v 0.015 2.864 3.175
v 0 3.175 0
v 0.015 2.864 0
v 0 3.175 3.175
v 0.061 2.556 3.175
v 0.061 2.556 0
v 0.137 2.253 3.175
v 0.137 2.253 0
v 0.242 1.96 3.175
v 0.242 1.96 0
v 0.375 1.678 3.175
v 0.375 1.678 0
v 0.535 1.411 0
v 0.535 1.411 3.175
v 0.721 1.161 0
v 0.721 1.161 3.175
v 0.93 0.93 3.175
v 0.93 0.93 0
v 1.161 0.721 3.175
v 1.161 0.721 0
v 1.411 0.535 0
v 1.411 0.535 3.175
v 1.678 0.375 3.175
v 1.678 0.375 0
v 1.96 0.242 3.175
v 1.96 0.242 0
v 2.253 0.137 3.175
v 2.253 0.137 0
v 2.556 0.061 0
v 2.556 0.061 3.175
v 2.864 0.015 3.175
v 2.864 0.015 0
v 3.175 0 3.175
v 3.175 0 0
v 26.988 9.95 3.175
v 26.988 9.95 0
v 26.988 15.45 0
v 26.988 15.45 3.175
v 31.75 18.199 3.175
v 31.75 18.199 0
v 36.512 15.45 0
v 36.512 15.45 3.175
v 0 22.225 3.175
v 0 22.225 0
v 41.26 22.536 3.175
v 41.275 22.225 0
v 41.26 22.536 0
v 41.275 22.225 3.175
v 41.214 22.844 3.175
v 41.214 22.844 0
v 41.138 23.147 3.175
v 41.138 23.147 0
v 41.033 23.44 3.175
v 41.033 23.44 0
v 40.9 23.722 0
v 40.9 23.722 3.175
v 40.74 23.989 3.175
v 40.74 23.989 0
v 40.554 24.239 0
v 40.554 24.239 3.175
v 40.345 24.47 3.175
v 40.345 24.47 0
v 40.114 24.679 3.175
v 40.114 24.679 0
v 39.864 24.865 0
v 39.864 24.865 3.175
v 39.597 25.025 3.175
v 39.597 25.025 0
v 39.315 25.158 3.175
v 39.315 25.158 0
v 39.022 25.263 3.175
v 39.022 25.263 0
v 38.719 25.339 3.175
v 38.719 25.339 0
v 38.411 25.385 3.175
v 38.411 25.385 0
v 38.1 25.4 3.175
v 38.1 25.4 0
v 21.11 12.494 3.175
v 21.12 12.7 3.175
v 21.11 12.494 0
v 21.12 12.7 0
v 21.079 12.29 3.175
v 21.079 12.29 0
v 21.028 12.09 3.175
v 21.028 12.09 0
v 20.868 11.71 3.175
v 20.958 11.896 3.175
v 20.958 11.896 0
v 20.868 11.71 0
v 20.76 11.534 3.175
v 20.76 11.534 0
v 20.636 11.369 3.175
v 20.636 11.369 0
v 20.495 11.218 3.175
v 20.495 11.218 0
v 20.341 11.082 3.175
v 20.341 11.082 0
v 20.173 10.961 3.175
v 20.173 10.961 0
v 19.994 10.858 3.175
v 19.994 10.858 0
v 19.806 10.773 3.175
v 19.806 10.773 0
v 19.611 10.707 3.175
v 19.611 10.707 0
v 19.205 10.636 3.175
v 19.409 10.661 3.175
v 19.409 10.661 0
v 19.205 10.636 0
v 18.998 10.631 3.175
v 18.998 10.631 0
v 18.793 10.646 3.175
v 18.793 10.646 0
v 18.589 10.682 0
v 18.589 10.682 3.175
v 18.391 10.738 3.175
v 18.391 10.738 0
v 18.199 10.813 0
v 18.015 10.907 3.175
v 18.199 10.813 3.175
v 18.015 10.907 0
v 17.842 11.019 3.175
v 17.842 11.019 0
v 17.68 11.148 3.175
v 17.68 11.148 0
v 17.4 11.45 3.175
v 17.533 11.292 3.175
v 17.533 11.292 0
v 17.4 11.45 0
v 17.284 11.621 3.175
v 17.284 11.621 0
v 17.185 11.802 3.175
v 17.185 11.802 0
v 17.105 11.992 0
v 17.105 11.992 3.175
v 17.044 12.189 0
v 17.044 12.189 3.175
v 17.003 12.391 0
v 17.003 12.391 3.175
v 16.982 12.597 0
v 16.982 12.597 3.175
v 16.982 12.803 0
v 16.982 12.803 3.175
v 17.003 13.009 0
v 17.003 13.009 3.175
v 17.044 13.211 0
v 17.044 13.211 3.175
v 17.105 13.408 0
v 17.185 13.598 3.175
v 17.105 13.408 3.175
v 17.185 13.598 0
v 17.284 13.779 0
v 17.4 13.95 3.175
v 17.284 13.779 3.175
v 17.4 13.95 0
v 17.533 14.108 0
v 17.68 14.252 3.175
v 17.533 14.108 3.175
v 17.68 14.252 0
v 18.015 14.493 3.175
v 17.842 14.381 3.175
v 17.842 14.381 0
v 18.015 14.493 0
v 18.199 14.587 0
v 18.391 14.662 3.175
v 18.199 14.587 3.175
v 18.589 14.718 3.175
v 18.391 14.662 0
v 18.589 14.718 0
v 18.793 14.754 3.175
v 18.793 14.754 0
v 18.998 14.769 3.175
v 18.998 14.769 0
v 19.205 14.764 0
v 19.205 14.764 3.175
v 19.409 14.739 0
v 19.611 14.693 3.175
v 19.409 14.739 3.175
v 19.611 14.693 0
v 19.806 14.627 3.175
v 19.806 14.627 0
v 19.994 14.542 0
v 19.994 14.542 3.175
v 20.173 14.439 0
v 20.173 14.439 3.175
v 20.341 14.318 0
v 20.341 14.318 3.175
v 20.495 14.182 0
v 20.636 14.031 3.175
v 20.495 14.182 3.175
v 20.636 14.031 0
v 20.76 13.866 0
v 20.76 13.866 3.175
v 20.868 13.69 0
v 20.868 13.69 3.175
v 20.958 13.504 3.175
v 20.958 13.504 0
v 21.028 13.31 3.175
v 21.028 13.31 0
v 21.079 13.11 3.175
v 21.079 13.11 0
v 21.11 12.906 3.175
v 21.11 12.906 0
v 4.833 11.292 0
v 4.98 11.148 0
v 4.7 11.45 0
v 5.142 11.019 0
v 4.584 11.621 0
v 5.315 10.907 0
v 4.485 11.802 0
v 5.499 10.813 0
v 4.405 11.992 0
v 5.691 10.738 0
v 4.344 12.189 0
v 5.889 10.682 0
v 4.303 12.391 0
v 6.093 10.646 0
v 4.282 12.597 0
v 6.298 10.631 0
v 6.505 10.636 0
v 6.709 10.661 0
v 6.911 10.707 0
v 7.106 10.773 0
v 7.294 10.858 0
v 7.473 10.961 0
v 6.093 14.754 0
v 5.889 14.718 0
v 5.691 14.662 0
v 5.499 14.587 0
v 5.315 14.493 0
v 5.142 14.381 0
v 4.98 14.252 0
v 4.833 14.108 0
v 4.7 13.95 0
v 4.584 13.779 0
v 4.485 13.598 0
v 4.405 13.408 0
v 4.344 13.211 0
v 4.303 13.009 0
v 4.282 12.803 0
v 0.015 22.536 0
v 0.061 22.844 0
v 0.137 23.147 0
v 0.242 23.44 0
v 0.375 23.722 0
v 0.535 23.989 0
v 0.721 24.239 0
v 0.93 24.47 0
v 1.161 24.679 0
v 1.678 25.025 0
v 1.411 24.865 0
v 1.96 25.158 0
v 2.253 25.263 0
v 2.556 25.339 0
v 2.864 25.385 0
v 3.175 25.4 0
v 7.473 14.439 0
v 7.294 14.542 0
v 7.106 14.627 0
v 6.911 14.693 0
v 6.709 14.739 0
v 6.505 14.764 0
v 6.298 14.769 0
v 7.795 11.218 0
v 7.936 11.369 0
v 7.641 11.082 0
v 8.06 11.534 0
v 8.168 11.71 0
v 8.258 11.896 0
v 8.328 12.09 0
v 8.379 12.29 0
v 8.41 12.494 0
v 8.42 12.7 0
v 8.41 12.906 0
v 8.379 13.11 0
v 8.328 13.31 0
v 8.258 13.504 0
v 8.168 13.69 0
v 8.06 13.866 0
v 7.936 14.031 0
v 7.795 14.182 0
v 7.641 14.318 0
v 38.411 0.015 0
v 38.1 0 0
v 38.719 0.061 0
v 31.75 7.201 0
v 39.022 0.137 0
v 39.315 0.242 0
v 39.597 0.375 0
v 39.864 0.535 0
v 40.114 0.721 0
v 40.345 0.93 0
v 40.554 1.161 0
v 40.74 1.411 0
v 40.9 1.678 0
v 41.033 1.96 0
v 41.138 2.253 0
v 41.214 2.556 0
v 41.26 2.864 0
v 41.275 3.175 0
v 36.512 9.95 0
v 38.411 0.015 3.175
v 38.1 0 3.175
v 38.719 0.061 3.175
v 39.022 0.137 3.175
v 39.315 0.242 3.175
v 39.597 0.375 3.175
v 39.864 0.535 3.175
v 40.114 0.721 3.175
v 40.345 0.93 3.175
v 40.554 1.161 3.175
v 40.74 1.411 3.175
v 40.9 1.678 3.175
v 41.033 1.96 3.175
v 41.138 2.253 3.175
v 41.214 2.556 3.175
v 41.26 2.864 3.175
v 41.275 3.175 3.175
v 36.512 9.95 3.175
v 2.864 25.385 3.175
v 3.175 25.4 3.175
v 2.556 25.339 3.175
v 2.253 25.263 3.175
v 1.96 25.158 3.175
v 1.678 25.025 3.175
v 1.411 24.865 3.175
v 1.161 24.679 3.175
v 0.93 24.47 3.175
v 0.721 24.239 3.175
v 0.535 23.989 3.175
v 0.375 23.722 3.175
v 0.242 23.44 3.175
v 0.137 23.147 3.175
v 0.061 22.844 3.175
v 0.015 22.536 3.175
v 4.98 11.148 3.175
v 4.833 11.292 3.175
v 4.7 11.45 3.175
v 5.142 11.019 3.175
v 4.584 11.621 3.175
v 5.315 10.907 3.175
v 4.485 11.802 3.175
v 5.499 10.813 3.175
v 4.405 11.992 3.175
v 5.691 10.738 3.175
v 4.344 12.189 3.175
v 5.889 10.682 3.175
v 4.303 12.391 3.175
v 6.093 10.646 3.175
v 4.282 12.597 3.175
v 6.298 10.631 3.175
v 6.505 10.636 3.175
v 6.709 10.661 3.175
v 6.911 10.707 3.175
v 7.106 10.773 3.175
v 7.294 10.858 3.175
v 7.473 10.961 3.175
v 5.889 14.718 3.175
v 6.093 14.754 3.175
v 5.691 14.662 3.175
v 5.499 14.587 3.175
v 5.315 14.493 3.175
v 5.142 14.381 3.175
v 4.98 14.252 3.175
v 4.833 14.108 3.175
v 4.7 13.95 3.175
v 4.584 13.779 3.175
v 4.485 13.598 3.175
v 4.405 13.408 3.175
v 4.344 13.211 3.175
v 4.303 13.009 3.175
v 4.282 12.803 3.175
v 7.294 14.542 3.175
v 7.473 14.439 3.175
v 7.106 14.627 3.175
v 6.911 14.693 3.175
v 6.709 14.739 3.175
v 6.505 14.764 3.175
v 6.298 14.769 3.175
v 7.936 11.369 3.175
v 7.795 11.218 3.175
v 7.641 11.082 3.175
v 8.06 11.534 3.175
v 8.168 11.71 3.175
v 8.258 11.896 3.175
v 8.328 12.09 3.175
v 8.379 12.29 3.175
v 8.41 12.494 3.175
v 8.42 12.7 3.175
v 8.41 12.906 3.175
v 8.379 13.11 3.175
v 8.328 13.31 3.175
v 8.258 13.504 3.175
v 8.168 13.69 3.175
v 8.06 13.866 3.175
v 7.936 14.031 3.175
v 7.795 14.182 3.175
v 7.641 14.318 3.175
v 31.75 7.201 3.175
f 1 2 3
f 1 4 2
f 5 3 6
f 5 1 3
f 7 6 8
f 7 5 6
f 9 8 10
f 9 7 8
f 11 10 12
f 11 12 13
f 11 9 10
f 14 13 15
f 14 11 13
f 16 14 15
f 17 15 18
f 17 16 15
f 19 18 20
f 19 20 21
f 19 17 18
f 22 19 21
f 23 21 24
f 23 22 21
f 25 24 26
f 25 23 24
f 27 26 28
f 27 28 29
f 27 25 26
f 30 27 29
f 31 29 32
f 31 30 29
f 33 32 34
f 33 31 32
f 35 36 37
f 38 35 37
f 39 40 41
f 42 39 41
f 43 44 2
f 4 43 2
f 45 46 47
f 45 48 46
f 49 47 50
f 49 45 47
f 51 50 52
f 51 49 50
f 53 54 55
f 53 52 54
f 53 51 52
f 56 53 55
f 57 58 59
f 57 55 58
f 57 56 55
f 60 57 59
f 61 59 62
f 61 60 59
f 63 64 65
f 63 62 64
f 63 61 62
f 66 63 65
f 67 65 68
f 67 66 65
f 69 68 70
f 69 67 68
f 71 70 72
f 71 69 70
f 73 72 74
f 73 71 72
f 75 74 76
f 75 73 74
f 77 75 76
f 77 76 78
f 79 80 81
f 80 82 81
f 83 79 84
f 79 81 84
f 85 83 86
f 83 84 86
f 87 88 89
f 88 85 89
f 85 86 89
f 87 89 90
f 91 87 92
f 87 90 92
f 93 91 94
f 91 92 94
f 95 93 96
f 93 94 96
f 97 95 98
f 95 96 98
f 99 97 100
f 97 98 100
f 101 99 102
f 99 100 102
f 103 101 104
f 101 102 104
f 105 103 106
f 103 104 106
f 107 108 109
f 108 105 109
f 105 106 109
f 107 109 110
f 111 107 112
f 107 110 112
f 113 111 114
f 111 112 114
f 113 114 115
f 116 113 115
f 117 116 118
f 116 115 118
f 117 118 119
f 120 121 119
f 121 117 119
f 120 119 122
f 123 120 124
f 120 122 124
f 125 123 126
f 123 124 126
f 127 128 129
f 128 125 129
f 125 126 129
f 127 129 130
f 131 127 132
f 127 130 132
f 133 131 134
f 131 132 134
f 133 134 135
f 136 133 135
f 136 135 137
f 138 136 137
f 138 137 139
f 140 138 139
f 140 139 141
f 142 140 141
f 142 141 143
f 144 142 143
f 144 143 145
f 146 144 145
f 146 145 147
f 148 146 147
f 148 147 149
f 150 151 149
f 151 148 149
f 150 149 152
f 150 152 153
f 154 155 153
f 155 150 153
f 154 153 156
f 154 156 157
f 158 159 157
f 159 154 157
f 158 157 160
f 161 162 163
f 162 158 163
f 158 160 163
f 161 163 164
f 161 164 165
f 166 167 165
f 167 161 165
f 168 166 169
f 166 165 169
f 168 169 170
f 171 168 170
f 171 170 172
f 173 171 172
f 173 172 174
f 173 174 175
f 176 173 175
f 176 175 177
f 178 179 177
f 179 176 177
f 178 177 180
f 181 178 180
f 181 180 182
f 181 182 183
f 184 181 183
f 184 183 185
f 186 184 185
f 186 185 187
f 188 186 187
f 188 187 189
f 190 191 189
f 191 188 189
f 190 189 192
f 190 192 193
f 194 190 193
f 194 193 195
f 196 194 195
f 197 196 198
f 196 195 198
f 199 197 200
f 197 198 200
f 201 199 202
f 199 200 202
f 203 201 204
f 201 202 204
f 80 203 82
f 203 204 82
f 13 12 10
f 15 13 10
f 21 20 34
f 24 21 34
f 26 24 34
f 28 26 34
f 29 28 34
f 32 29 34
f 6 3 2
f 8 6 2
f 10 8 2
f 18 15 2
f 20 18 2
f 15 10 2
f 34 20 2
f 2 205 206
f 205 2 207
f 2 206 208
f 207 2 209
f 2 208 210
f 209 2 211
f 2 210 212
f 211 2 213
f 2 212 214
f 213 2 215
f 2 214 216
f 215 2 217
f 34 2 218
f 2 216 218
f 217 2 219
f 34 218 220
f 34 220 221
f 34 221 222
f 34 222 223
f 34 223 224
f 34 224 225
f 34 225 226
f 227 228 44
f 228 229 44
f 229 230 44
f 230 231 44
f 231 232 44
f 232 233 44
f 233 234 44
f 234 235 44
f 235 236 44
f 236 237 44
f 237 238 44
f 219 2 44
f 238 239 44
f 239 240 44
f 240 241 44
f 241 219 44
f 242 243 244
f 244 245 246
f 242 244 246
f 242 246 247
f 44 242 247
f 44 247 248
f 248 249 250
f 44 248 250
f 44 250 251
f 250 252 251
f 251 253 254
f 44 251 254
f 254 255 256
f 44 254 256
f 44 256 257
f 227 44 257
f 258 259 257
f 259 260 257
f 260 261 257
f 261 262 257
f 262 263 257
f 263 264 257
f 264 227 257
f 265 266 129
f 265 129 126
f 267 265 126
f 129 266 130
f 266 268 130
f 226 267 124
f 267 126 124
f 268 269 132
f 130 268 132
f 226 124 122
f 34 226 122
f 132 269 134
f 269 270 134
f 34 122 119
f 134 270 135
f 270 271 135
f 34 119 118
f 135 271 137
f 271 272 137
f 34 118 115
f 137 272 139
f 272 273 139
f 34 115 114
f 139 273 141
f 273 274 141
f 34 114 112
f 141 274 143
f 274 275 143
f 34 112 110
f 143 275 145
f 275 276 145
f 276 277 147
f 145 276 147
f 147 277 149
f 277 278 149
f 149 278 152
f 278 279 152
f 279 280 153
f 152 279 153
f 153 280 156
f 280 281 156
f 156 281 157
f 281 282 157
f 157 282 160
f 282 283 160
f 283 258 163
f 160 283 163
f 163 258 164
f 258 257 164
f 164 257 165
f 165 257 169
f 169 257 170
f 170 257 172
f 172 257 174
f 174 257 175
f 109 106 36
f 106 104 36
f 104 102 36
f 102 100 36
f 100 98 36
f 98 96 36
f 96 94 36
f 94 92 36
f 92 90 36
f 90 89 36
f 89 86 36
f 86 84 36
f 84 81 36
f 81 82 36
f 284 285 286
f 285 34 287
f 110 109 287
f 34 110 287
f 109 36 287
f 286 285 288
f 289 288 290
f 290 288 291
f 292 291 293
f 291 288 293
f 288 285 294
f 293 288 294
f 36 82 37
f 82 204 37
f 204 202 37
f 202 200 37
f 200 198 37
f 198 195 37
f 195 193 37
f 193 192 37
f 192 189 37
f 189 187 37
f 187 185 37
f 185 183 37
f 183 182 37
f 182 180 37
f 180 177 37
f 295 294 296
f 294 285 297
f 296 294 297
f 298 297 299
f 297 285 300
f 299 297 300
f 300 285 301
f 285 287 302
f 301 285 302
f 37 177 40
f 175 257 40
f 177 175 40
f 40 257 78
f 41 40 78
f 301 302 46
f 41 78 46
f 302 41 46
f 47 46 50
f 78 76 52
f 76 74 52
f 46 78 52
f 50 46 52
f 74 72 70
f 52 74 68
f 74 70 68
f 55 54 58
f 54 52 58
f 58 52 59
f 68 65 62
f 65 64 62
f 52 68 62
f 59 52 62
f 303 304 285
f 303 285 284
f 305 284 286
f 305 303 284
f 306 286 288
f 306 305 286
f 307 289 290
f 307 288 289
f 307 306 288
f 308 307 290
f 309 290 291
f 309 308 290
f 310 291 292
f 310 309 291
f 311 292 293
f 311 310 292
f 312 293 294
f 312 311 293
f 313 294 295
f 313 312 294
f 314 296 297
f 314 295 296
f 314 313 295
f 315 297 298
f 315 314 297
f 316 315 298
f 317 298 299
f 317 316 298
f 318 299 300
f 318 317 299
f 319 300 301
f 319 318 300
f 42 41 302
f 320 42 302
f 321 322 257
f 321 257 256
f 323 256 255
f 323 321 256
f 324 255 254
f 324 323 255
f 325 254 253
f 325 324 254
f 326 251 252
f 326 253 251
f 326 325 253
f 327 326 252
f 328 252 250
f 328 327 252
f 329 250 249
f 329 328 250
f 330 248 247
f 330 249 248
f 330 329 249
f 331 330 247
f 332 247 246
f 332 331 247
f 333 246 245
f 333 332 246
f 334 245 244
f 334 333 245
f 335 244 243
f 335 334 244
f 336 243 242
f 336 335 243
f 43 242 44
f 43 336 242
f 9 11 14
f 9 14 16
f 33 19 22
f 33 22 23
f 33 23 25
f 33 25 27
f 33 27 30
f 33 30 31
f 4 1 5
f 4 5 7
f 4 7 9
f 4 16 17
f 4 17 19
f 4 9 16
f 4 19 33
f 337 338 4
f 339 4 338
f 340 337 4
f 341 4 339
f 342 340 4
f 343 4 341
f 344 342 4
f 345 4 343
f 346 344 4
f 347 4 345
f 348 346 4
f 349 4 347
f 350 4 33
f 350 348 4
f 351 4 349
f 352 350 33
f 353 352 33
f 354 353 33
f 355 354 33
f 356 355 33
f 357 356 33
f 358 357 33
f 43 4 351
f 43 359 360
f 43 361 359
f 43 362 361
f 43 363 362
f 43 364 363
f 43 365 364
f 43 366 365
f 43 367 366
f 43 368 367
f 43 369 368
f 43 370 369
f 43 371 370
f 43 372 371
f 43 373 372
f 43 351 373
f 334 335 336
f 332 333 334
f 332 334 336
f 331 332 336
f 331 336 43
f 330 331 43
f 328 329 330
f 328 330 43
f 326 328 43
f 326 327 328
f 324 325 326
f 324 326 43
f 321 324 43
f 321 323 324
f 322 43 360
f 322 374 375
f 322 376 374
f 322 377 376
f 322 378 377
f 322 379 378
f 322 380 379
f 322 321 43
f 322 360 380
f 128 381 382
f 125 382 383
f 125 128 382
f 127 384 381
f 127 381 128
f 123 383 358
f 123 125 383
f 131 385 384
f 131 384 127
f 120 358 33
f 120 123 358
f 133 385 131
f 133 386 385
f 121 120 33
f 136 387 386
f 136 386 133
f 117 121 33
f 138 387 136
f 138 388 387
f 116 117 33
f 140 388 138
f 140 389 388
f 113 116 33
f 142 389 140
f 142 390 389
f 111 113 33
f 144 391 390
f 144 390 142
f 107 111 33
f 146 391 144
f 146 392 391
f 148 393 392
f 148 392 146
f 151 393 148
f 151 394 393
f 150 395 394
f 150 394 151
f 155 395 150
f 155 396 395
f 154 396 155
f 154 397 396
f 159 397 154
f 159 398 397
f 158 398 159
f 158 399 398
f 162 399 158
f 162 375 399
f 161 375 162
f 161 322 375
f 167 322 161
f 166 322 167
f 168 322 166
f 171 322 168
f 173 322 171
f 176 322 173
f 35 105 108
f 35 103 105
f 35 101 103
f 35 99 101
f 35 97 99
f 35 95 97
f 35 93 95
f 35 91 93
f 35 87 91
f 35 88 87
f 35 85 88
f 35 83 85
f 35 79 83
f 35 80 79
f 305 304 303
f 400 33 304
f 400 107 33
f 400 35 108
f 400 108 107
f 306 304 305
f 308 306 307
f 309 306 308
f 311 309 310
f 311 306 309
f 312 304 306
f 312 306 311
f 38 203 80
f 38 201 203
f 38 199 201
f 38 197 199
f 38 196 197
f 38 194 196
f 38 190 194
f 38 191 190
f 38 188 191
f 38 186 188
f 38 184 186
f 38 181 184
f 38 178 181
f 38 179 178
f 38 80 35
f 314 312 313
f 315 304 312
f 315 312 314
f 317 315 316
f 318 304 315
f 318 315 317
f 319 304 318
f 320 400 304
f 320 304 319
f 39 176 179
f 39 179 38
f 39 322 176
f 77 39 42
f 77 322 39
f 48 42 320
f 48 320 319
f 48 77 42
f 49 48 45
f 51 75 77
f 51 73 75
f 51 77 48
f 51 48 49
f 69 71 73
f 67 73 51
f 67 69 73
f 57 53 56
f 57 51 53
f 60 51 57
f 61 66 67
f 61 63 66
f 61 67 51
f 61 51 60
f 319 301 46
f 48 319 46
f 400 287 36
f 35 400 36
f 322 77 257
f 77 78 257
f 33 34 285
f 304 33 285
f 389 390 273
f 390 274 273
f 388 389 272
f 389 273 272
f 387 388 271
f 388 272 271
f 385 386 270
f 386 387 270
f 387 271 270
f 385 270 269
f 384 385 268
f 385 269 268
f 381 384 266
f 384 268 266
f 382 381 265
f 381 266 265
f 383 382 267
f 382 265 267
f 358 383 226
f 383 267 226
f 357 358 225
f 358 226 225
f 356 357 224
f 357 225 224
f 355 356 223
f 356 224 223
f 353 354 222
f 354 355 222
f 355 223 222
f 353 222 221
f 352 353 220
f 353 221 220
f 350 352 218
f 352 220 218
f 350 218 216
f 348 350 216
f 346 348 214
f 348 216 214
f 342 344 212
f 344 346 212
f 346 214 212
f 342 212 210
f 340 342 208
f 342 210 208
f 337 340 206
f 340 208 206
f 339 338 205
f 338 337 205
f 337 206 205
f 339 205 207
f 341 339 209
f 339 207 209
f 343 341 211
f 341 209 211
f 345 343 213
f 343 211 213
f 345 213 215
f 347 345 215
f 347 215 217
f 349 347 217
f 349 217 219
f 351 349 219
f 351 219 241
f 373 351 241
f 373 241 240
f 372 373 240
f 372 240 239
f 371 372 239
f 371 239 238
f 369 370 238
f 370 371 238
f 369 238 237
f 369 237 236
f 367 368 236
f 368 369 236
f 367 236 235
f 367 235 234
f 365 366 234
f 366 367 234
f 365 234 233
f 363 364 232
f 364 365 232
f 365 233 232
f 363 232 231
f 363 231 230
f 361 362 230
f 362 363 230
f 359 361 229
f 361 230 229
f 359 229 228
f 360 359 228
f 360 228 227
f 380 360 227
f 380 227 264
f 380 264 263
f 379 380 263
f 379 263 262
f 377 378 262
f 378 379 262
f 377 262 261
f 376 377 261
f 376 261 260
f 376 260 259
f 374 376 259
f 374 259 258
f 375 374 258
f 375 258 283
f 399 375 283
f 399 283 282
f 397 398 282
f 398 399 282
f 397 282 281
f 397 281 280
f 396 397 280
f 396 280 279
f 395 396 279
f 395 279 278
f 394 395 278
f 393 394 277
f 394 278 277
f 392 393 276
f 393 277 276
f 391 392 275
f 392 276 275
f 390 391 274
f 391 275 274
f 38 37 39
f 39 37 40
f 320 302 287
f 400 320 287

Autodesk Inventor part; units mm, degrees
ref_plane "YZ Plane" through (0, 0, 0) normal (1, 0, 0) x (0, 1, 0)
ref_plane "XZ Plane" through (0, 0, 0) normal (0, 1, 0) x (-1, 0, 0)
ref_plane "XY Plane" through (0, 0, 0) normal (0, 0, 1) x (1, 0, 0)
sketch "Sketch1" plane through (0, 0, 0) normal (0, 0, 1) x (1, 0, 0)
  line L0 (0, 0) -> (41.275, 0)
  line L1 (41.275, 0) -> (41.275, 25.4)
  line L2 (41.275, 25.4) -> (0, 25.4)
  line L3 (0, 25.4) -> (0, 0)
  circle A0 centre (6.35, 12.7) radius 2.0701
  line L4 (31.75, 18.1993) -> (36.5125, 15.4496)
  line L5 (36.5125, 15.4496) -> (36.5125, 9.9504)
  line L6 (36.5125, 9.9504) -> (31.75, 7.2007)
  line L7 (31.75, 7.2007) -> (26.9875, 9.9504)
  line L8 (26.9875, 9.9504) -> (26.9875, 15.4496)
  line L9 (26.9875, 15.4496) -> (31.75, 18.1993)
  circle A1 centre (19.05, 12.7) radius 2.0701
  point P0 (31.75, 12.7)
  dimension "d0" = 41.275
  dimension "d1" = 25.4
  dimension "d2" = 4.1402
  dimension "d3" = 12.7
  dimension "d4" = 6.35
  dimension "d5" = 25.4
  dimension "d6" = 9.525
  dimension "d7" = 12.7
  dimension "d13" = 12.7
extrude "Extrusion1" add sketch "Sketch1" along normal blind 3.175
fillet "Fillet1" radius 3.175 4 edges at (41.275, 25.4, 1.5875) (41.275, 0, 1.5875) (0, 25.4, 1.5875) (0, 0, 1.5875)
properties part number "Hex Spacer" material "Aluminum 6061"
